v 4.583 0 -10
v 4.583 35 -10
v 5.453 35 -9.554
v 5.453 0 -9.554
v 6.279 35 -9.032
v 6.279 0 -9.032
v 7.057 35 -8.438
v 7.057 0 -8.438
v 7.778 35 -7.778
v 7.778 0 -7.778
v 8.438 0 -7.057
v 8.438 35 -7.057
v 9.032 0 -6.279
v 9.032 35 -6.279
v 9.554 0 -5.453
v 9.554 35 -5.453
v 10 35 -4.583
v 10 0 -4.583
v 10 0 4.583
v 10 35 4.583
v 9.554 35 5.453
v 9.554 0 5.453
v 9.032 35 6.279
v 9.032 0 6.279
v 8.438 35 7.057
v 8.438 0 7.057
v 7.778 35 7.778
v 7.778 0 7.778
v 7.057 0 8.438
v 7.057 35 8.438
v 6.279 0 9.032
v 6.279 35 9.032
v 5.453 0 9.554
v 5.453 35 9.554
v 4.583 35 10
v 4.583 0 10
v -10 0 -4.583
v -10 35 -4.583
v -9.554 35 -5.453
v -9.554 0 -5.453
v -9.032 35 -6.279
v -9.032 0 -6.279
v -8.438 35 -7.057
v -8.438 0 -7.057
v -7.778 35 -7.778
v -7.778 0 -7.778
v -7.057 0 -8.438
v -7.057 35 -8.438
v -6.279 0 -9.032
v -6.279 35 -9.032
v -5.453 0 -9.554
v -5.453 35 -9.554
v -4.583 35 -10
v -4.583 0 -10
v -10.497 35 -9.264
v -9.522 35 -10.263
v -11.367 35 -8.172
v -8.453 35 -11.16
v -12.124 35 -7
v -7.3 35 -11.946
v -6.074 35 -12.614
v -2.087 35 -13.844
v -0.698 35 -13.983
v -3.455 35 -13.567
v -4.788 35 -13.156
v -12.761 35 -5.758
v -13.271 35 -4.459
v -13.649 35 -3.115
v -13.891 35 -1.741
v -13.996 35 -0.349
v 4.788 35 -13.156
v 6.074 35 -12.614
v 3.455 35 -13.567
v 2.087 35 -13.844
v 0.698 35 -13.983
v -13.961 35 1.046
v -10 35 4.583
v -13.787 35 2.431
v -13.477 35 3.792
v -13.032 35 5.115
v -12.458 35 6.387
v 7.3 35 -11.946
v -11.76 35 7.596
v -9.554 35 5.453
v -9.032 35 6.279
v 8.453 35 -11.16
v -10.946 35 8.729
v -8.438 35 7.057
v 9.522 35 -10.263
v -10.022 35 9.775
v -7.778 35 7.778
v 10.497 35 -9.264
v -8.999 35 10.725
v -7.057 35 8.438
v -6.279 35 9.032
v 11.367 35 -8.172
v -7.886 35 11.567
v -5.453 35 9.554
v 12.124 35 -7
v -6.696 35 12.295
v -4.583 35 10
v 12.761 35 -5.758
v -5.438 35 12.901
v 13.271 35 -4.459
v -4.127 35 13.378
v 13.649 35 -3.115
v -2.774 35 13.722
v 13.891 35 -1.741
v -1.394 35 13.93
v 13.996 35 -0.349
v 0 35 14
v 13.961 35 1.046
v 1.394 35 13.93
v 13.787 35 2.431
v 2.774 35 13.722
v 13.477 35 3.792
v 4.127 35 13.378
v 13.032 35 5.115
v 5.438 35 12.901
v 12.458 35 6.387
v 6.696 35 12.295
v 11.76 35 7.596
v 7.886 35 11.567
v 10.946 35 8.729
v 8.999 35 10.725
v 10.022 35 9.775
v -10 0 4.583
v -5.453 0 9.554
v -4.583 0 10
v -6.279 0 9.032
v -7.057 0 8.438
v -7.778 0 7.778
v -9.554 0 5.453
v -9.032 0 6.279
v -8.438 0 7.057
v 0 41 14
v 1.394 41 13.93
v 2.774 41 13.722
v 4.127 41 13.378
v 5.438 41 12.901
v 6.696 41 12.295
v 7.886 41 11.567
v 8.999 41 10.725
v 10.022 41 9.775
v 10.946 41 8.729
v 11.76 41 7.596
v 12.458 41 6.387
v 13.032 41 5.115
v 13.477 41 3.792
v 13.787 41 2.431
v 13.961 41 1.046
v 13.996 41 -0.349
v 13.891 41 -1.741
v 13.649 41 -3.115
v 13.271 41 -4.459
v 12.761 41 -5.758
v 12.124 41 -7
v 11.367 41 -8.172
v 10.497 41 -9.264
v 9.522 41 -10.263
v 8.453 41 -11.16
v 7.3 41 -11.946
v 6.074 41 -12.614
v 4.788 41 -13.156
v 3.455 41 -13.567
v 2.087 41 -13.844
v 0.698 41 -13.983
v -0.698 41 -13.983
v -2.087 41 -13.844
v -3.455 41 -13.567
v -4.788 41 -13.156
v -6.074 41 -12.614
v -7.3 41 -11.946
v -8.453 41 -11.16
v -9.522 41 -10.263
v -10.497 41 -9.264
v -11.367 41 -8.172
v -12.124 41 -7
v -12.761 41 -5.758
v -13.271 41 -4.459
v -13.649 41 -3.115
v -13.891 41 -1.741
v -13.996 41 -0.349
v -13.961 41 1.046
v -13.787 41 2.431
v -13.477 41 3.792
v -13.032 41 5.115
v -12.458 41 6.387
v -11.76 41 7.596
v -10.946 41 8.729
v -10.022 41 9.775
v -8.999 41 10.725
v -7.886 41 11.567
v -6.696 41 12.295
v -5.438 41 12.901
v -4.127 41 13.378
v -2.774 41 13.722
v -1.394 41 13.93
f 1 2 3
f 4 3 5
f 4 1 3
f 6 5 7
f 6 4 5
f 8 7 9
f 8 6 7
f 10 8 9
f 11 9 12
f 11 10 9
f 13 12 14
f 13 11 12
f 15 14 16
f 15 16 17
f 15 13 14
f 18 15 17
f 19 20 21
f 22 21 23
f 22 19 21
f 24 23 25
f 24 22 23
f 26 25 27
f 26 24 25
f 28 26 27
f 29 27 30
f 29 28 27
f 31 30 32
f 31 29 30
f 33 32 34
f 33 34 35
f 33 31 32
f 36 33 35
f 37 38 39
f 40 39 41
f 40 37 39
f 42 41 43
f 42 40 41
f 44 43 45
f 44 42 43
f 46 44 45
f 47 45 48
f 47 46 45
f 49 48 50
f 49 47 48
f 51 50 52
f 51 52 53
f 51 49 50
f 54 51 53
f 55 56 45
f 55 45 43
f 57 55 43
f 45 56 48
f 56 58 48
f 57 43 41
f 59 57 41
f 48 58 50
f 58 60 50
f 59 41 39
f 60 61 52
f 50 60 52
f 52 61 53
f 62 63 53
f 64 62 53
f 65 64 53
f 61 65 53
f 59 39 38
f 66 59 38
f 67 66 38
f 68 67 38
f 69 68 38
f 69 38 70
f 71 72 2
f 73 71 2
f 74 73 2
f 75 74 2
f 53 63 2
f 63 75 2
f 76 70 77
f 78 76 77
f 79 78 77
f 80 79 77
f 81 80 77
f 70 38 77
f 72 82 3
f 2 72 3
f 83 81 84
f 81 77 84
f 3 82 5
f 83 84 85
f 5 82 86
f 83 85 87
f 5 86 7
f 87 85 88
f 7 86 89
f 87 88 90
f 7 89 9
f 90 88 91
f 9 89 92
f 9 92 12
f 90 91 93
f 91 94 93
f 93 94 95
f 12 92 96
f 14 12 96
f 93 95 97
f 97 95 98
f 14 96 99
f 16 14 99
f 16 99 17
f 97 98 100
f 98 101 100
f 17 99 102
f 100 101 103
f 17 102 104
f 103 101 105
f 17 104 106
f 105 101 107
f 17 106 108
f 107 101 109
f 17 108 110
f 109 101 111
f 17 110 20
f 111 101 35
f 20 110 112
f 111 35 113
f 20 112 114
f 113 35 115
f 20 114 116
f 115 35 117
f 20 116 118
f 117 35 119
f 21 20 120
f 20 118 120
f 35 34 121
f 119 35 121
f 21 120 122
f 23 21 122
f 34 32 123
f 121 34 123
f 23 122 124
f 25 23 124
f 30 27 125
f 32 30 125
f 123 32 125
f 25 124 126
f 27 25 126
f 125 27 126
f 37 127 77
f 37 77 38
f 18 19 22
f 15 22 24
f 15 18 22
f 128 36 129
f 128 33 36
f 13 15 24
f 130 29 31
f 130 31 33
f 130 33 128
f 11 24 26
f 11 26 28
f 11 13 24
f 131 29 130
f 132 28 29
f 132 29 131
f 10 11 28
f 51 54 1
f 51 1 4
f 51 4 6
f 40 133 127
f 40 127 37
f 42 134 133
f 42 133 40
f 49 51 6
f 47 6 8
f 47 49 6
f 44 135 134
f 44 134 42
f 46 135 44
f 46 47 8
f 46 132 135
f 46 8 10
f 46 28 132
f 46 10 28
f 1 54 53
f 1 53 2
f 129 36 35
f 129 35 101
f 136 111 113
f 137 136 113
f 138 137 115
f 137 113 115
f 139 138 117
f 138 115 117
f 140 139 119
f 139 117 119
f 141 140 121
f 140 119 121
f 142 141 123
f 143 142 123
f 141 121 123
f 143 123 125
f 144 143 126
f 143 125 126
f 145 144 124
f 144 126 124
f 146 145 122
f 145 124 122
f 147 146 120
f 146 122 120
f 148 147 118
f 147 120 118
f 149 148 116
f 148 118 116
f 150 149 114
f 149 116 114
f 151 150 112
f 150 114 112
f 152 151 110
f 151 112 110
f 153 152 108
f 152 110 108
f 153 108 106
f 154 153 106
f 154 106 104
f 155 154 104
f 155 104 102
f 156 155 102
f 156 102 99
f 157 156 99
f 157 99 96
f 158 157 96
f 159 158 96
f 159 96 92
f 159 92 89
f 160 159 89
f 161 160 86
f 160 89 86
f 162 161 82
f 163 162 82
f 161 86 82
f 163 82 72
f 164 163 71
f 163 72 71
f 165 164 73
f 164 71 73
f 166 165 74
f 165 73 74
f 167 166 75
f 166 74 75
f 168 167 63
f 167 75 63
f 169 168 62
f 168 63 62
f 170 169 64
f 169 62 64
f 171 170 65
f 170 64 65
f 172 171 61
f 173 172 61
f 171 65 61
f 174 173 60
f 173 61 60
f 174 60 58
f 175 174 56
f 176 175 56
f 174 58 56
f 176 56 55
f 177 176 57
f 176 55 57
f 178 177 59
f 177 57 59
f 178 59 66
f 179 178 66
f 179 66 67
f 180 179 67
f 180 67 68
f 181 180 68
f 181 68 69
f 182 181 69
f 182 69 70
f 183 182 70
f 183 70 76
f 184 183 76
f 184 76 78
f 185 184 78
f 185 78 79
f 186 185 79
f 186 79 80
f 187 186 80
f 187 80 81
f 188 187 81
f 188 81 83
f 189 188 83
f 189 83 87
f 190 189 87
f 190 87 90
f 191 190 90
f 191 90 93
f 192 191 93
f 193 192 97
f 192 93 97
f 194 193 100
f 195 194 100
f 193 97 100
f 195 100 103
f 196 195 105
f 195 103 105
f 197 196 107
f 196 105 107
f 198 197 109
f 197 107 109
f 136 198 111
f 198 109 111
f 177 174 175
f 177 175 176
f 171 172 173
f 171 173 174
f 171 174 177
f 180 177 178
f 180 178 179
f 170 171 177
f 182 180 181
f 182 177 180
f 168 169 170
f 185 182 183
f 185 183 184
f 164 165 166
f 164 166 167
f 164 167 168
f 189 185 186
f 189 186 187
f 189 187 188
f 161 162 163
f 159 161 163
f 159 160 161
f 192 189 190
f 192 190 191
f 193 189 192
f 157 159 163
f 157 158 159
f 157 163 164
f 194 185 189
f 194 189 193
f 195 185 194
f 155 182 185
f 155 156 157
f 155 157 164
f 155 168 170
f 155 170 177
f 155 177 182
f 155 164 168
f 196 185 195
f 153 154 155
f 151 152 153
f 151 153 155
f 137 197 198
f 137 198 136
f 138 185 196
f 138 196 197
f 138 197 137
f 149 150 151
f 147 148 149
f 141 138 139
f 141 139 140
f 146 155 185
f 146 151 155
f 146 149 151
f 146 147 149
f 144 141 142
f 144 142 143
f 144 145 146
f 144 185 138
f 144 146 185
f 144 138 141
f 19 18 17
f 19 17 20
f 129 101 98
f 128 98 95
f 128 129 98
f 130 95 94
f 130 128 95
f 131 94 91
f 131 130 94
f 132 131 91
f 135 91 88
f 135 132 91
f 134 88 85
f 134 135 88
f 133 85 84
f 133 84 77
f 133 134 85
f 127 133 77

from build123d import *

# Parameters (mm, degrees)
EXTRUDE_1_DEPTH = 35
SKETCH_2_R      = 14
EXTRUDE_2_DEPTH = 6


with BuildPart() as part:
    # 草图1 → 凸台-拉伸1 (new body)
    with BuildSketch(Plane(origin=(0, 0, 0), x_dir=(1, 0, 0), z_dir=(0, 1, 0))):
        with BuildLine():
            Line((4.582575695, -10), (-4.582575695, -10))
            ThreePointArc((-4.582575695, -10), (-7.778174593, -7.778174593), (-10, -4.582575695))
            Line((-10, -4.582575695), (-10, 4.582575695))
            ThreePointArc((-10, 4.582575695), (-7.778174593, 7.778174593), (-4.582575695, 10))
            Line((-4.582575695, 10), (4.582575695, 10))
            ThreePointArc((4.582575695, 10), (7.778174593, 7.778174593), (10, 4.582575695))
            Line((10, 4.582575695), (10, -4.582575695))
            ThreePointArc((10, -4.582575695), (7.778174593, -7.778174593), (4.582575695, -10))
        make_face()
    extrude(amount=EXTRUDE_1_DEPTH)

    # 草图2 → 凸台-拉伸2 (add)
    with BuildSketch(Plane(origin=(0, 35, 0), x_dir=(1, 0, 0), z_dir=(0, 1, 0))):
        with Locations(Location((0, 0, 0), (0, 0, 270))):
            Circle(SKETCH_2_R)
    extrude(amount=EXTRUDE_2_DEPTH)


solid = part.part
